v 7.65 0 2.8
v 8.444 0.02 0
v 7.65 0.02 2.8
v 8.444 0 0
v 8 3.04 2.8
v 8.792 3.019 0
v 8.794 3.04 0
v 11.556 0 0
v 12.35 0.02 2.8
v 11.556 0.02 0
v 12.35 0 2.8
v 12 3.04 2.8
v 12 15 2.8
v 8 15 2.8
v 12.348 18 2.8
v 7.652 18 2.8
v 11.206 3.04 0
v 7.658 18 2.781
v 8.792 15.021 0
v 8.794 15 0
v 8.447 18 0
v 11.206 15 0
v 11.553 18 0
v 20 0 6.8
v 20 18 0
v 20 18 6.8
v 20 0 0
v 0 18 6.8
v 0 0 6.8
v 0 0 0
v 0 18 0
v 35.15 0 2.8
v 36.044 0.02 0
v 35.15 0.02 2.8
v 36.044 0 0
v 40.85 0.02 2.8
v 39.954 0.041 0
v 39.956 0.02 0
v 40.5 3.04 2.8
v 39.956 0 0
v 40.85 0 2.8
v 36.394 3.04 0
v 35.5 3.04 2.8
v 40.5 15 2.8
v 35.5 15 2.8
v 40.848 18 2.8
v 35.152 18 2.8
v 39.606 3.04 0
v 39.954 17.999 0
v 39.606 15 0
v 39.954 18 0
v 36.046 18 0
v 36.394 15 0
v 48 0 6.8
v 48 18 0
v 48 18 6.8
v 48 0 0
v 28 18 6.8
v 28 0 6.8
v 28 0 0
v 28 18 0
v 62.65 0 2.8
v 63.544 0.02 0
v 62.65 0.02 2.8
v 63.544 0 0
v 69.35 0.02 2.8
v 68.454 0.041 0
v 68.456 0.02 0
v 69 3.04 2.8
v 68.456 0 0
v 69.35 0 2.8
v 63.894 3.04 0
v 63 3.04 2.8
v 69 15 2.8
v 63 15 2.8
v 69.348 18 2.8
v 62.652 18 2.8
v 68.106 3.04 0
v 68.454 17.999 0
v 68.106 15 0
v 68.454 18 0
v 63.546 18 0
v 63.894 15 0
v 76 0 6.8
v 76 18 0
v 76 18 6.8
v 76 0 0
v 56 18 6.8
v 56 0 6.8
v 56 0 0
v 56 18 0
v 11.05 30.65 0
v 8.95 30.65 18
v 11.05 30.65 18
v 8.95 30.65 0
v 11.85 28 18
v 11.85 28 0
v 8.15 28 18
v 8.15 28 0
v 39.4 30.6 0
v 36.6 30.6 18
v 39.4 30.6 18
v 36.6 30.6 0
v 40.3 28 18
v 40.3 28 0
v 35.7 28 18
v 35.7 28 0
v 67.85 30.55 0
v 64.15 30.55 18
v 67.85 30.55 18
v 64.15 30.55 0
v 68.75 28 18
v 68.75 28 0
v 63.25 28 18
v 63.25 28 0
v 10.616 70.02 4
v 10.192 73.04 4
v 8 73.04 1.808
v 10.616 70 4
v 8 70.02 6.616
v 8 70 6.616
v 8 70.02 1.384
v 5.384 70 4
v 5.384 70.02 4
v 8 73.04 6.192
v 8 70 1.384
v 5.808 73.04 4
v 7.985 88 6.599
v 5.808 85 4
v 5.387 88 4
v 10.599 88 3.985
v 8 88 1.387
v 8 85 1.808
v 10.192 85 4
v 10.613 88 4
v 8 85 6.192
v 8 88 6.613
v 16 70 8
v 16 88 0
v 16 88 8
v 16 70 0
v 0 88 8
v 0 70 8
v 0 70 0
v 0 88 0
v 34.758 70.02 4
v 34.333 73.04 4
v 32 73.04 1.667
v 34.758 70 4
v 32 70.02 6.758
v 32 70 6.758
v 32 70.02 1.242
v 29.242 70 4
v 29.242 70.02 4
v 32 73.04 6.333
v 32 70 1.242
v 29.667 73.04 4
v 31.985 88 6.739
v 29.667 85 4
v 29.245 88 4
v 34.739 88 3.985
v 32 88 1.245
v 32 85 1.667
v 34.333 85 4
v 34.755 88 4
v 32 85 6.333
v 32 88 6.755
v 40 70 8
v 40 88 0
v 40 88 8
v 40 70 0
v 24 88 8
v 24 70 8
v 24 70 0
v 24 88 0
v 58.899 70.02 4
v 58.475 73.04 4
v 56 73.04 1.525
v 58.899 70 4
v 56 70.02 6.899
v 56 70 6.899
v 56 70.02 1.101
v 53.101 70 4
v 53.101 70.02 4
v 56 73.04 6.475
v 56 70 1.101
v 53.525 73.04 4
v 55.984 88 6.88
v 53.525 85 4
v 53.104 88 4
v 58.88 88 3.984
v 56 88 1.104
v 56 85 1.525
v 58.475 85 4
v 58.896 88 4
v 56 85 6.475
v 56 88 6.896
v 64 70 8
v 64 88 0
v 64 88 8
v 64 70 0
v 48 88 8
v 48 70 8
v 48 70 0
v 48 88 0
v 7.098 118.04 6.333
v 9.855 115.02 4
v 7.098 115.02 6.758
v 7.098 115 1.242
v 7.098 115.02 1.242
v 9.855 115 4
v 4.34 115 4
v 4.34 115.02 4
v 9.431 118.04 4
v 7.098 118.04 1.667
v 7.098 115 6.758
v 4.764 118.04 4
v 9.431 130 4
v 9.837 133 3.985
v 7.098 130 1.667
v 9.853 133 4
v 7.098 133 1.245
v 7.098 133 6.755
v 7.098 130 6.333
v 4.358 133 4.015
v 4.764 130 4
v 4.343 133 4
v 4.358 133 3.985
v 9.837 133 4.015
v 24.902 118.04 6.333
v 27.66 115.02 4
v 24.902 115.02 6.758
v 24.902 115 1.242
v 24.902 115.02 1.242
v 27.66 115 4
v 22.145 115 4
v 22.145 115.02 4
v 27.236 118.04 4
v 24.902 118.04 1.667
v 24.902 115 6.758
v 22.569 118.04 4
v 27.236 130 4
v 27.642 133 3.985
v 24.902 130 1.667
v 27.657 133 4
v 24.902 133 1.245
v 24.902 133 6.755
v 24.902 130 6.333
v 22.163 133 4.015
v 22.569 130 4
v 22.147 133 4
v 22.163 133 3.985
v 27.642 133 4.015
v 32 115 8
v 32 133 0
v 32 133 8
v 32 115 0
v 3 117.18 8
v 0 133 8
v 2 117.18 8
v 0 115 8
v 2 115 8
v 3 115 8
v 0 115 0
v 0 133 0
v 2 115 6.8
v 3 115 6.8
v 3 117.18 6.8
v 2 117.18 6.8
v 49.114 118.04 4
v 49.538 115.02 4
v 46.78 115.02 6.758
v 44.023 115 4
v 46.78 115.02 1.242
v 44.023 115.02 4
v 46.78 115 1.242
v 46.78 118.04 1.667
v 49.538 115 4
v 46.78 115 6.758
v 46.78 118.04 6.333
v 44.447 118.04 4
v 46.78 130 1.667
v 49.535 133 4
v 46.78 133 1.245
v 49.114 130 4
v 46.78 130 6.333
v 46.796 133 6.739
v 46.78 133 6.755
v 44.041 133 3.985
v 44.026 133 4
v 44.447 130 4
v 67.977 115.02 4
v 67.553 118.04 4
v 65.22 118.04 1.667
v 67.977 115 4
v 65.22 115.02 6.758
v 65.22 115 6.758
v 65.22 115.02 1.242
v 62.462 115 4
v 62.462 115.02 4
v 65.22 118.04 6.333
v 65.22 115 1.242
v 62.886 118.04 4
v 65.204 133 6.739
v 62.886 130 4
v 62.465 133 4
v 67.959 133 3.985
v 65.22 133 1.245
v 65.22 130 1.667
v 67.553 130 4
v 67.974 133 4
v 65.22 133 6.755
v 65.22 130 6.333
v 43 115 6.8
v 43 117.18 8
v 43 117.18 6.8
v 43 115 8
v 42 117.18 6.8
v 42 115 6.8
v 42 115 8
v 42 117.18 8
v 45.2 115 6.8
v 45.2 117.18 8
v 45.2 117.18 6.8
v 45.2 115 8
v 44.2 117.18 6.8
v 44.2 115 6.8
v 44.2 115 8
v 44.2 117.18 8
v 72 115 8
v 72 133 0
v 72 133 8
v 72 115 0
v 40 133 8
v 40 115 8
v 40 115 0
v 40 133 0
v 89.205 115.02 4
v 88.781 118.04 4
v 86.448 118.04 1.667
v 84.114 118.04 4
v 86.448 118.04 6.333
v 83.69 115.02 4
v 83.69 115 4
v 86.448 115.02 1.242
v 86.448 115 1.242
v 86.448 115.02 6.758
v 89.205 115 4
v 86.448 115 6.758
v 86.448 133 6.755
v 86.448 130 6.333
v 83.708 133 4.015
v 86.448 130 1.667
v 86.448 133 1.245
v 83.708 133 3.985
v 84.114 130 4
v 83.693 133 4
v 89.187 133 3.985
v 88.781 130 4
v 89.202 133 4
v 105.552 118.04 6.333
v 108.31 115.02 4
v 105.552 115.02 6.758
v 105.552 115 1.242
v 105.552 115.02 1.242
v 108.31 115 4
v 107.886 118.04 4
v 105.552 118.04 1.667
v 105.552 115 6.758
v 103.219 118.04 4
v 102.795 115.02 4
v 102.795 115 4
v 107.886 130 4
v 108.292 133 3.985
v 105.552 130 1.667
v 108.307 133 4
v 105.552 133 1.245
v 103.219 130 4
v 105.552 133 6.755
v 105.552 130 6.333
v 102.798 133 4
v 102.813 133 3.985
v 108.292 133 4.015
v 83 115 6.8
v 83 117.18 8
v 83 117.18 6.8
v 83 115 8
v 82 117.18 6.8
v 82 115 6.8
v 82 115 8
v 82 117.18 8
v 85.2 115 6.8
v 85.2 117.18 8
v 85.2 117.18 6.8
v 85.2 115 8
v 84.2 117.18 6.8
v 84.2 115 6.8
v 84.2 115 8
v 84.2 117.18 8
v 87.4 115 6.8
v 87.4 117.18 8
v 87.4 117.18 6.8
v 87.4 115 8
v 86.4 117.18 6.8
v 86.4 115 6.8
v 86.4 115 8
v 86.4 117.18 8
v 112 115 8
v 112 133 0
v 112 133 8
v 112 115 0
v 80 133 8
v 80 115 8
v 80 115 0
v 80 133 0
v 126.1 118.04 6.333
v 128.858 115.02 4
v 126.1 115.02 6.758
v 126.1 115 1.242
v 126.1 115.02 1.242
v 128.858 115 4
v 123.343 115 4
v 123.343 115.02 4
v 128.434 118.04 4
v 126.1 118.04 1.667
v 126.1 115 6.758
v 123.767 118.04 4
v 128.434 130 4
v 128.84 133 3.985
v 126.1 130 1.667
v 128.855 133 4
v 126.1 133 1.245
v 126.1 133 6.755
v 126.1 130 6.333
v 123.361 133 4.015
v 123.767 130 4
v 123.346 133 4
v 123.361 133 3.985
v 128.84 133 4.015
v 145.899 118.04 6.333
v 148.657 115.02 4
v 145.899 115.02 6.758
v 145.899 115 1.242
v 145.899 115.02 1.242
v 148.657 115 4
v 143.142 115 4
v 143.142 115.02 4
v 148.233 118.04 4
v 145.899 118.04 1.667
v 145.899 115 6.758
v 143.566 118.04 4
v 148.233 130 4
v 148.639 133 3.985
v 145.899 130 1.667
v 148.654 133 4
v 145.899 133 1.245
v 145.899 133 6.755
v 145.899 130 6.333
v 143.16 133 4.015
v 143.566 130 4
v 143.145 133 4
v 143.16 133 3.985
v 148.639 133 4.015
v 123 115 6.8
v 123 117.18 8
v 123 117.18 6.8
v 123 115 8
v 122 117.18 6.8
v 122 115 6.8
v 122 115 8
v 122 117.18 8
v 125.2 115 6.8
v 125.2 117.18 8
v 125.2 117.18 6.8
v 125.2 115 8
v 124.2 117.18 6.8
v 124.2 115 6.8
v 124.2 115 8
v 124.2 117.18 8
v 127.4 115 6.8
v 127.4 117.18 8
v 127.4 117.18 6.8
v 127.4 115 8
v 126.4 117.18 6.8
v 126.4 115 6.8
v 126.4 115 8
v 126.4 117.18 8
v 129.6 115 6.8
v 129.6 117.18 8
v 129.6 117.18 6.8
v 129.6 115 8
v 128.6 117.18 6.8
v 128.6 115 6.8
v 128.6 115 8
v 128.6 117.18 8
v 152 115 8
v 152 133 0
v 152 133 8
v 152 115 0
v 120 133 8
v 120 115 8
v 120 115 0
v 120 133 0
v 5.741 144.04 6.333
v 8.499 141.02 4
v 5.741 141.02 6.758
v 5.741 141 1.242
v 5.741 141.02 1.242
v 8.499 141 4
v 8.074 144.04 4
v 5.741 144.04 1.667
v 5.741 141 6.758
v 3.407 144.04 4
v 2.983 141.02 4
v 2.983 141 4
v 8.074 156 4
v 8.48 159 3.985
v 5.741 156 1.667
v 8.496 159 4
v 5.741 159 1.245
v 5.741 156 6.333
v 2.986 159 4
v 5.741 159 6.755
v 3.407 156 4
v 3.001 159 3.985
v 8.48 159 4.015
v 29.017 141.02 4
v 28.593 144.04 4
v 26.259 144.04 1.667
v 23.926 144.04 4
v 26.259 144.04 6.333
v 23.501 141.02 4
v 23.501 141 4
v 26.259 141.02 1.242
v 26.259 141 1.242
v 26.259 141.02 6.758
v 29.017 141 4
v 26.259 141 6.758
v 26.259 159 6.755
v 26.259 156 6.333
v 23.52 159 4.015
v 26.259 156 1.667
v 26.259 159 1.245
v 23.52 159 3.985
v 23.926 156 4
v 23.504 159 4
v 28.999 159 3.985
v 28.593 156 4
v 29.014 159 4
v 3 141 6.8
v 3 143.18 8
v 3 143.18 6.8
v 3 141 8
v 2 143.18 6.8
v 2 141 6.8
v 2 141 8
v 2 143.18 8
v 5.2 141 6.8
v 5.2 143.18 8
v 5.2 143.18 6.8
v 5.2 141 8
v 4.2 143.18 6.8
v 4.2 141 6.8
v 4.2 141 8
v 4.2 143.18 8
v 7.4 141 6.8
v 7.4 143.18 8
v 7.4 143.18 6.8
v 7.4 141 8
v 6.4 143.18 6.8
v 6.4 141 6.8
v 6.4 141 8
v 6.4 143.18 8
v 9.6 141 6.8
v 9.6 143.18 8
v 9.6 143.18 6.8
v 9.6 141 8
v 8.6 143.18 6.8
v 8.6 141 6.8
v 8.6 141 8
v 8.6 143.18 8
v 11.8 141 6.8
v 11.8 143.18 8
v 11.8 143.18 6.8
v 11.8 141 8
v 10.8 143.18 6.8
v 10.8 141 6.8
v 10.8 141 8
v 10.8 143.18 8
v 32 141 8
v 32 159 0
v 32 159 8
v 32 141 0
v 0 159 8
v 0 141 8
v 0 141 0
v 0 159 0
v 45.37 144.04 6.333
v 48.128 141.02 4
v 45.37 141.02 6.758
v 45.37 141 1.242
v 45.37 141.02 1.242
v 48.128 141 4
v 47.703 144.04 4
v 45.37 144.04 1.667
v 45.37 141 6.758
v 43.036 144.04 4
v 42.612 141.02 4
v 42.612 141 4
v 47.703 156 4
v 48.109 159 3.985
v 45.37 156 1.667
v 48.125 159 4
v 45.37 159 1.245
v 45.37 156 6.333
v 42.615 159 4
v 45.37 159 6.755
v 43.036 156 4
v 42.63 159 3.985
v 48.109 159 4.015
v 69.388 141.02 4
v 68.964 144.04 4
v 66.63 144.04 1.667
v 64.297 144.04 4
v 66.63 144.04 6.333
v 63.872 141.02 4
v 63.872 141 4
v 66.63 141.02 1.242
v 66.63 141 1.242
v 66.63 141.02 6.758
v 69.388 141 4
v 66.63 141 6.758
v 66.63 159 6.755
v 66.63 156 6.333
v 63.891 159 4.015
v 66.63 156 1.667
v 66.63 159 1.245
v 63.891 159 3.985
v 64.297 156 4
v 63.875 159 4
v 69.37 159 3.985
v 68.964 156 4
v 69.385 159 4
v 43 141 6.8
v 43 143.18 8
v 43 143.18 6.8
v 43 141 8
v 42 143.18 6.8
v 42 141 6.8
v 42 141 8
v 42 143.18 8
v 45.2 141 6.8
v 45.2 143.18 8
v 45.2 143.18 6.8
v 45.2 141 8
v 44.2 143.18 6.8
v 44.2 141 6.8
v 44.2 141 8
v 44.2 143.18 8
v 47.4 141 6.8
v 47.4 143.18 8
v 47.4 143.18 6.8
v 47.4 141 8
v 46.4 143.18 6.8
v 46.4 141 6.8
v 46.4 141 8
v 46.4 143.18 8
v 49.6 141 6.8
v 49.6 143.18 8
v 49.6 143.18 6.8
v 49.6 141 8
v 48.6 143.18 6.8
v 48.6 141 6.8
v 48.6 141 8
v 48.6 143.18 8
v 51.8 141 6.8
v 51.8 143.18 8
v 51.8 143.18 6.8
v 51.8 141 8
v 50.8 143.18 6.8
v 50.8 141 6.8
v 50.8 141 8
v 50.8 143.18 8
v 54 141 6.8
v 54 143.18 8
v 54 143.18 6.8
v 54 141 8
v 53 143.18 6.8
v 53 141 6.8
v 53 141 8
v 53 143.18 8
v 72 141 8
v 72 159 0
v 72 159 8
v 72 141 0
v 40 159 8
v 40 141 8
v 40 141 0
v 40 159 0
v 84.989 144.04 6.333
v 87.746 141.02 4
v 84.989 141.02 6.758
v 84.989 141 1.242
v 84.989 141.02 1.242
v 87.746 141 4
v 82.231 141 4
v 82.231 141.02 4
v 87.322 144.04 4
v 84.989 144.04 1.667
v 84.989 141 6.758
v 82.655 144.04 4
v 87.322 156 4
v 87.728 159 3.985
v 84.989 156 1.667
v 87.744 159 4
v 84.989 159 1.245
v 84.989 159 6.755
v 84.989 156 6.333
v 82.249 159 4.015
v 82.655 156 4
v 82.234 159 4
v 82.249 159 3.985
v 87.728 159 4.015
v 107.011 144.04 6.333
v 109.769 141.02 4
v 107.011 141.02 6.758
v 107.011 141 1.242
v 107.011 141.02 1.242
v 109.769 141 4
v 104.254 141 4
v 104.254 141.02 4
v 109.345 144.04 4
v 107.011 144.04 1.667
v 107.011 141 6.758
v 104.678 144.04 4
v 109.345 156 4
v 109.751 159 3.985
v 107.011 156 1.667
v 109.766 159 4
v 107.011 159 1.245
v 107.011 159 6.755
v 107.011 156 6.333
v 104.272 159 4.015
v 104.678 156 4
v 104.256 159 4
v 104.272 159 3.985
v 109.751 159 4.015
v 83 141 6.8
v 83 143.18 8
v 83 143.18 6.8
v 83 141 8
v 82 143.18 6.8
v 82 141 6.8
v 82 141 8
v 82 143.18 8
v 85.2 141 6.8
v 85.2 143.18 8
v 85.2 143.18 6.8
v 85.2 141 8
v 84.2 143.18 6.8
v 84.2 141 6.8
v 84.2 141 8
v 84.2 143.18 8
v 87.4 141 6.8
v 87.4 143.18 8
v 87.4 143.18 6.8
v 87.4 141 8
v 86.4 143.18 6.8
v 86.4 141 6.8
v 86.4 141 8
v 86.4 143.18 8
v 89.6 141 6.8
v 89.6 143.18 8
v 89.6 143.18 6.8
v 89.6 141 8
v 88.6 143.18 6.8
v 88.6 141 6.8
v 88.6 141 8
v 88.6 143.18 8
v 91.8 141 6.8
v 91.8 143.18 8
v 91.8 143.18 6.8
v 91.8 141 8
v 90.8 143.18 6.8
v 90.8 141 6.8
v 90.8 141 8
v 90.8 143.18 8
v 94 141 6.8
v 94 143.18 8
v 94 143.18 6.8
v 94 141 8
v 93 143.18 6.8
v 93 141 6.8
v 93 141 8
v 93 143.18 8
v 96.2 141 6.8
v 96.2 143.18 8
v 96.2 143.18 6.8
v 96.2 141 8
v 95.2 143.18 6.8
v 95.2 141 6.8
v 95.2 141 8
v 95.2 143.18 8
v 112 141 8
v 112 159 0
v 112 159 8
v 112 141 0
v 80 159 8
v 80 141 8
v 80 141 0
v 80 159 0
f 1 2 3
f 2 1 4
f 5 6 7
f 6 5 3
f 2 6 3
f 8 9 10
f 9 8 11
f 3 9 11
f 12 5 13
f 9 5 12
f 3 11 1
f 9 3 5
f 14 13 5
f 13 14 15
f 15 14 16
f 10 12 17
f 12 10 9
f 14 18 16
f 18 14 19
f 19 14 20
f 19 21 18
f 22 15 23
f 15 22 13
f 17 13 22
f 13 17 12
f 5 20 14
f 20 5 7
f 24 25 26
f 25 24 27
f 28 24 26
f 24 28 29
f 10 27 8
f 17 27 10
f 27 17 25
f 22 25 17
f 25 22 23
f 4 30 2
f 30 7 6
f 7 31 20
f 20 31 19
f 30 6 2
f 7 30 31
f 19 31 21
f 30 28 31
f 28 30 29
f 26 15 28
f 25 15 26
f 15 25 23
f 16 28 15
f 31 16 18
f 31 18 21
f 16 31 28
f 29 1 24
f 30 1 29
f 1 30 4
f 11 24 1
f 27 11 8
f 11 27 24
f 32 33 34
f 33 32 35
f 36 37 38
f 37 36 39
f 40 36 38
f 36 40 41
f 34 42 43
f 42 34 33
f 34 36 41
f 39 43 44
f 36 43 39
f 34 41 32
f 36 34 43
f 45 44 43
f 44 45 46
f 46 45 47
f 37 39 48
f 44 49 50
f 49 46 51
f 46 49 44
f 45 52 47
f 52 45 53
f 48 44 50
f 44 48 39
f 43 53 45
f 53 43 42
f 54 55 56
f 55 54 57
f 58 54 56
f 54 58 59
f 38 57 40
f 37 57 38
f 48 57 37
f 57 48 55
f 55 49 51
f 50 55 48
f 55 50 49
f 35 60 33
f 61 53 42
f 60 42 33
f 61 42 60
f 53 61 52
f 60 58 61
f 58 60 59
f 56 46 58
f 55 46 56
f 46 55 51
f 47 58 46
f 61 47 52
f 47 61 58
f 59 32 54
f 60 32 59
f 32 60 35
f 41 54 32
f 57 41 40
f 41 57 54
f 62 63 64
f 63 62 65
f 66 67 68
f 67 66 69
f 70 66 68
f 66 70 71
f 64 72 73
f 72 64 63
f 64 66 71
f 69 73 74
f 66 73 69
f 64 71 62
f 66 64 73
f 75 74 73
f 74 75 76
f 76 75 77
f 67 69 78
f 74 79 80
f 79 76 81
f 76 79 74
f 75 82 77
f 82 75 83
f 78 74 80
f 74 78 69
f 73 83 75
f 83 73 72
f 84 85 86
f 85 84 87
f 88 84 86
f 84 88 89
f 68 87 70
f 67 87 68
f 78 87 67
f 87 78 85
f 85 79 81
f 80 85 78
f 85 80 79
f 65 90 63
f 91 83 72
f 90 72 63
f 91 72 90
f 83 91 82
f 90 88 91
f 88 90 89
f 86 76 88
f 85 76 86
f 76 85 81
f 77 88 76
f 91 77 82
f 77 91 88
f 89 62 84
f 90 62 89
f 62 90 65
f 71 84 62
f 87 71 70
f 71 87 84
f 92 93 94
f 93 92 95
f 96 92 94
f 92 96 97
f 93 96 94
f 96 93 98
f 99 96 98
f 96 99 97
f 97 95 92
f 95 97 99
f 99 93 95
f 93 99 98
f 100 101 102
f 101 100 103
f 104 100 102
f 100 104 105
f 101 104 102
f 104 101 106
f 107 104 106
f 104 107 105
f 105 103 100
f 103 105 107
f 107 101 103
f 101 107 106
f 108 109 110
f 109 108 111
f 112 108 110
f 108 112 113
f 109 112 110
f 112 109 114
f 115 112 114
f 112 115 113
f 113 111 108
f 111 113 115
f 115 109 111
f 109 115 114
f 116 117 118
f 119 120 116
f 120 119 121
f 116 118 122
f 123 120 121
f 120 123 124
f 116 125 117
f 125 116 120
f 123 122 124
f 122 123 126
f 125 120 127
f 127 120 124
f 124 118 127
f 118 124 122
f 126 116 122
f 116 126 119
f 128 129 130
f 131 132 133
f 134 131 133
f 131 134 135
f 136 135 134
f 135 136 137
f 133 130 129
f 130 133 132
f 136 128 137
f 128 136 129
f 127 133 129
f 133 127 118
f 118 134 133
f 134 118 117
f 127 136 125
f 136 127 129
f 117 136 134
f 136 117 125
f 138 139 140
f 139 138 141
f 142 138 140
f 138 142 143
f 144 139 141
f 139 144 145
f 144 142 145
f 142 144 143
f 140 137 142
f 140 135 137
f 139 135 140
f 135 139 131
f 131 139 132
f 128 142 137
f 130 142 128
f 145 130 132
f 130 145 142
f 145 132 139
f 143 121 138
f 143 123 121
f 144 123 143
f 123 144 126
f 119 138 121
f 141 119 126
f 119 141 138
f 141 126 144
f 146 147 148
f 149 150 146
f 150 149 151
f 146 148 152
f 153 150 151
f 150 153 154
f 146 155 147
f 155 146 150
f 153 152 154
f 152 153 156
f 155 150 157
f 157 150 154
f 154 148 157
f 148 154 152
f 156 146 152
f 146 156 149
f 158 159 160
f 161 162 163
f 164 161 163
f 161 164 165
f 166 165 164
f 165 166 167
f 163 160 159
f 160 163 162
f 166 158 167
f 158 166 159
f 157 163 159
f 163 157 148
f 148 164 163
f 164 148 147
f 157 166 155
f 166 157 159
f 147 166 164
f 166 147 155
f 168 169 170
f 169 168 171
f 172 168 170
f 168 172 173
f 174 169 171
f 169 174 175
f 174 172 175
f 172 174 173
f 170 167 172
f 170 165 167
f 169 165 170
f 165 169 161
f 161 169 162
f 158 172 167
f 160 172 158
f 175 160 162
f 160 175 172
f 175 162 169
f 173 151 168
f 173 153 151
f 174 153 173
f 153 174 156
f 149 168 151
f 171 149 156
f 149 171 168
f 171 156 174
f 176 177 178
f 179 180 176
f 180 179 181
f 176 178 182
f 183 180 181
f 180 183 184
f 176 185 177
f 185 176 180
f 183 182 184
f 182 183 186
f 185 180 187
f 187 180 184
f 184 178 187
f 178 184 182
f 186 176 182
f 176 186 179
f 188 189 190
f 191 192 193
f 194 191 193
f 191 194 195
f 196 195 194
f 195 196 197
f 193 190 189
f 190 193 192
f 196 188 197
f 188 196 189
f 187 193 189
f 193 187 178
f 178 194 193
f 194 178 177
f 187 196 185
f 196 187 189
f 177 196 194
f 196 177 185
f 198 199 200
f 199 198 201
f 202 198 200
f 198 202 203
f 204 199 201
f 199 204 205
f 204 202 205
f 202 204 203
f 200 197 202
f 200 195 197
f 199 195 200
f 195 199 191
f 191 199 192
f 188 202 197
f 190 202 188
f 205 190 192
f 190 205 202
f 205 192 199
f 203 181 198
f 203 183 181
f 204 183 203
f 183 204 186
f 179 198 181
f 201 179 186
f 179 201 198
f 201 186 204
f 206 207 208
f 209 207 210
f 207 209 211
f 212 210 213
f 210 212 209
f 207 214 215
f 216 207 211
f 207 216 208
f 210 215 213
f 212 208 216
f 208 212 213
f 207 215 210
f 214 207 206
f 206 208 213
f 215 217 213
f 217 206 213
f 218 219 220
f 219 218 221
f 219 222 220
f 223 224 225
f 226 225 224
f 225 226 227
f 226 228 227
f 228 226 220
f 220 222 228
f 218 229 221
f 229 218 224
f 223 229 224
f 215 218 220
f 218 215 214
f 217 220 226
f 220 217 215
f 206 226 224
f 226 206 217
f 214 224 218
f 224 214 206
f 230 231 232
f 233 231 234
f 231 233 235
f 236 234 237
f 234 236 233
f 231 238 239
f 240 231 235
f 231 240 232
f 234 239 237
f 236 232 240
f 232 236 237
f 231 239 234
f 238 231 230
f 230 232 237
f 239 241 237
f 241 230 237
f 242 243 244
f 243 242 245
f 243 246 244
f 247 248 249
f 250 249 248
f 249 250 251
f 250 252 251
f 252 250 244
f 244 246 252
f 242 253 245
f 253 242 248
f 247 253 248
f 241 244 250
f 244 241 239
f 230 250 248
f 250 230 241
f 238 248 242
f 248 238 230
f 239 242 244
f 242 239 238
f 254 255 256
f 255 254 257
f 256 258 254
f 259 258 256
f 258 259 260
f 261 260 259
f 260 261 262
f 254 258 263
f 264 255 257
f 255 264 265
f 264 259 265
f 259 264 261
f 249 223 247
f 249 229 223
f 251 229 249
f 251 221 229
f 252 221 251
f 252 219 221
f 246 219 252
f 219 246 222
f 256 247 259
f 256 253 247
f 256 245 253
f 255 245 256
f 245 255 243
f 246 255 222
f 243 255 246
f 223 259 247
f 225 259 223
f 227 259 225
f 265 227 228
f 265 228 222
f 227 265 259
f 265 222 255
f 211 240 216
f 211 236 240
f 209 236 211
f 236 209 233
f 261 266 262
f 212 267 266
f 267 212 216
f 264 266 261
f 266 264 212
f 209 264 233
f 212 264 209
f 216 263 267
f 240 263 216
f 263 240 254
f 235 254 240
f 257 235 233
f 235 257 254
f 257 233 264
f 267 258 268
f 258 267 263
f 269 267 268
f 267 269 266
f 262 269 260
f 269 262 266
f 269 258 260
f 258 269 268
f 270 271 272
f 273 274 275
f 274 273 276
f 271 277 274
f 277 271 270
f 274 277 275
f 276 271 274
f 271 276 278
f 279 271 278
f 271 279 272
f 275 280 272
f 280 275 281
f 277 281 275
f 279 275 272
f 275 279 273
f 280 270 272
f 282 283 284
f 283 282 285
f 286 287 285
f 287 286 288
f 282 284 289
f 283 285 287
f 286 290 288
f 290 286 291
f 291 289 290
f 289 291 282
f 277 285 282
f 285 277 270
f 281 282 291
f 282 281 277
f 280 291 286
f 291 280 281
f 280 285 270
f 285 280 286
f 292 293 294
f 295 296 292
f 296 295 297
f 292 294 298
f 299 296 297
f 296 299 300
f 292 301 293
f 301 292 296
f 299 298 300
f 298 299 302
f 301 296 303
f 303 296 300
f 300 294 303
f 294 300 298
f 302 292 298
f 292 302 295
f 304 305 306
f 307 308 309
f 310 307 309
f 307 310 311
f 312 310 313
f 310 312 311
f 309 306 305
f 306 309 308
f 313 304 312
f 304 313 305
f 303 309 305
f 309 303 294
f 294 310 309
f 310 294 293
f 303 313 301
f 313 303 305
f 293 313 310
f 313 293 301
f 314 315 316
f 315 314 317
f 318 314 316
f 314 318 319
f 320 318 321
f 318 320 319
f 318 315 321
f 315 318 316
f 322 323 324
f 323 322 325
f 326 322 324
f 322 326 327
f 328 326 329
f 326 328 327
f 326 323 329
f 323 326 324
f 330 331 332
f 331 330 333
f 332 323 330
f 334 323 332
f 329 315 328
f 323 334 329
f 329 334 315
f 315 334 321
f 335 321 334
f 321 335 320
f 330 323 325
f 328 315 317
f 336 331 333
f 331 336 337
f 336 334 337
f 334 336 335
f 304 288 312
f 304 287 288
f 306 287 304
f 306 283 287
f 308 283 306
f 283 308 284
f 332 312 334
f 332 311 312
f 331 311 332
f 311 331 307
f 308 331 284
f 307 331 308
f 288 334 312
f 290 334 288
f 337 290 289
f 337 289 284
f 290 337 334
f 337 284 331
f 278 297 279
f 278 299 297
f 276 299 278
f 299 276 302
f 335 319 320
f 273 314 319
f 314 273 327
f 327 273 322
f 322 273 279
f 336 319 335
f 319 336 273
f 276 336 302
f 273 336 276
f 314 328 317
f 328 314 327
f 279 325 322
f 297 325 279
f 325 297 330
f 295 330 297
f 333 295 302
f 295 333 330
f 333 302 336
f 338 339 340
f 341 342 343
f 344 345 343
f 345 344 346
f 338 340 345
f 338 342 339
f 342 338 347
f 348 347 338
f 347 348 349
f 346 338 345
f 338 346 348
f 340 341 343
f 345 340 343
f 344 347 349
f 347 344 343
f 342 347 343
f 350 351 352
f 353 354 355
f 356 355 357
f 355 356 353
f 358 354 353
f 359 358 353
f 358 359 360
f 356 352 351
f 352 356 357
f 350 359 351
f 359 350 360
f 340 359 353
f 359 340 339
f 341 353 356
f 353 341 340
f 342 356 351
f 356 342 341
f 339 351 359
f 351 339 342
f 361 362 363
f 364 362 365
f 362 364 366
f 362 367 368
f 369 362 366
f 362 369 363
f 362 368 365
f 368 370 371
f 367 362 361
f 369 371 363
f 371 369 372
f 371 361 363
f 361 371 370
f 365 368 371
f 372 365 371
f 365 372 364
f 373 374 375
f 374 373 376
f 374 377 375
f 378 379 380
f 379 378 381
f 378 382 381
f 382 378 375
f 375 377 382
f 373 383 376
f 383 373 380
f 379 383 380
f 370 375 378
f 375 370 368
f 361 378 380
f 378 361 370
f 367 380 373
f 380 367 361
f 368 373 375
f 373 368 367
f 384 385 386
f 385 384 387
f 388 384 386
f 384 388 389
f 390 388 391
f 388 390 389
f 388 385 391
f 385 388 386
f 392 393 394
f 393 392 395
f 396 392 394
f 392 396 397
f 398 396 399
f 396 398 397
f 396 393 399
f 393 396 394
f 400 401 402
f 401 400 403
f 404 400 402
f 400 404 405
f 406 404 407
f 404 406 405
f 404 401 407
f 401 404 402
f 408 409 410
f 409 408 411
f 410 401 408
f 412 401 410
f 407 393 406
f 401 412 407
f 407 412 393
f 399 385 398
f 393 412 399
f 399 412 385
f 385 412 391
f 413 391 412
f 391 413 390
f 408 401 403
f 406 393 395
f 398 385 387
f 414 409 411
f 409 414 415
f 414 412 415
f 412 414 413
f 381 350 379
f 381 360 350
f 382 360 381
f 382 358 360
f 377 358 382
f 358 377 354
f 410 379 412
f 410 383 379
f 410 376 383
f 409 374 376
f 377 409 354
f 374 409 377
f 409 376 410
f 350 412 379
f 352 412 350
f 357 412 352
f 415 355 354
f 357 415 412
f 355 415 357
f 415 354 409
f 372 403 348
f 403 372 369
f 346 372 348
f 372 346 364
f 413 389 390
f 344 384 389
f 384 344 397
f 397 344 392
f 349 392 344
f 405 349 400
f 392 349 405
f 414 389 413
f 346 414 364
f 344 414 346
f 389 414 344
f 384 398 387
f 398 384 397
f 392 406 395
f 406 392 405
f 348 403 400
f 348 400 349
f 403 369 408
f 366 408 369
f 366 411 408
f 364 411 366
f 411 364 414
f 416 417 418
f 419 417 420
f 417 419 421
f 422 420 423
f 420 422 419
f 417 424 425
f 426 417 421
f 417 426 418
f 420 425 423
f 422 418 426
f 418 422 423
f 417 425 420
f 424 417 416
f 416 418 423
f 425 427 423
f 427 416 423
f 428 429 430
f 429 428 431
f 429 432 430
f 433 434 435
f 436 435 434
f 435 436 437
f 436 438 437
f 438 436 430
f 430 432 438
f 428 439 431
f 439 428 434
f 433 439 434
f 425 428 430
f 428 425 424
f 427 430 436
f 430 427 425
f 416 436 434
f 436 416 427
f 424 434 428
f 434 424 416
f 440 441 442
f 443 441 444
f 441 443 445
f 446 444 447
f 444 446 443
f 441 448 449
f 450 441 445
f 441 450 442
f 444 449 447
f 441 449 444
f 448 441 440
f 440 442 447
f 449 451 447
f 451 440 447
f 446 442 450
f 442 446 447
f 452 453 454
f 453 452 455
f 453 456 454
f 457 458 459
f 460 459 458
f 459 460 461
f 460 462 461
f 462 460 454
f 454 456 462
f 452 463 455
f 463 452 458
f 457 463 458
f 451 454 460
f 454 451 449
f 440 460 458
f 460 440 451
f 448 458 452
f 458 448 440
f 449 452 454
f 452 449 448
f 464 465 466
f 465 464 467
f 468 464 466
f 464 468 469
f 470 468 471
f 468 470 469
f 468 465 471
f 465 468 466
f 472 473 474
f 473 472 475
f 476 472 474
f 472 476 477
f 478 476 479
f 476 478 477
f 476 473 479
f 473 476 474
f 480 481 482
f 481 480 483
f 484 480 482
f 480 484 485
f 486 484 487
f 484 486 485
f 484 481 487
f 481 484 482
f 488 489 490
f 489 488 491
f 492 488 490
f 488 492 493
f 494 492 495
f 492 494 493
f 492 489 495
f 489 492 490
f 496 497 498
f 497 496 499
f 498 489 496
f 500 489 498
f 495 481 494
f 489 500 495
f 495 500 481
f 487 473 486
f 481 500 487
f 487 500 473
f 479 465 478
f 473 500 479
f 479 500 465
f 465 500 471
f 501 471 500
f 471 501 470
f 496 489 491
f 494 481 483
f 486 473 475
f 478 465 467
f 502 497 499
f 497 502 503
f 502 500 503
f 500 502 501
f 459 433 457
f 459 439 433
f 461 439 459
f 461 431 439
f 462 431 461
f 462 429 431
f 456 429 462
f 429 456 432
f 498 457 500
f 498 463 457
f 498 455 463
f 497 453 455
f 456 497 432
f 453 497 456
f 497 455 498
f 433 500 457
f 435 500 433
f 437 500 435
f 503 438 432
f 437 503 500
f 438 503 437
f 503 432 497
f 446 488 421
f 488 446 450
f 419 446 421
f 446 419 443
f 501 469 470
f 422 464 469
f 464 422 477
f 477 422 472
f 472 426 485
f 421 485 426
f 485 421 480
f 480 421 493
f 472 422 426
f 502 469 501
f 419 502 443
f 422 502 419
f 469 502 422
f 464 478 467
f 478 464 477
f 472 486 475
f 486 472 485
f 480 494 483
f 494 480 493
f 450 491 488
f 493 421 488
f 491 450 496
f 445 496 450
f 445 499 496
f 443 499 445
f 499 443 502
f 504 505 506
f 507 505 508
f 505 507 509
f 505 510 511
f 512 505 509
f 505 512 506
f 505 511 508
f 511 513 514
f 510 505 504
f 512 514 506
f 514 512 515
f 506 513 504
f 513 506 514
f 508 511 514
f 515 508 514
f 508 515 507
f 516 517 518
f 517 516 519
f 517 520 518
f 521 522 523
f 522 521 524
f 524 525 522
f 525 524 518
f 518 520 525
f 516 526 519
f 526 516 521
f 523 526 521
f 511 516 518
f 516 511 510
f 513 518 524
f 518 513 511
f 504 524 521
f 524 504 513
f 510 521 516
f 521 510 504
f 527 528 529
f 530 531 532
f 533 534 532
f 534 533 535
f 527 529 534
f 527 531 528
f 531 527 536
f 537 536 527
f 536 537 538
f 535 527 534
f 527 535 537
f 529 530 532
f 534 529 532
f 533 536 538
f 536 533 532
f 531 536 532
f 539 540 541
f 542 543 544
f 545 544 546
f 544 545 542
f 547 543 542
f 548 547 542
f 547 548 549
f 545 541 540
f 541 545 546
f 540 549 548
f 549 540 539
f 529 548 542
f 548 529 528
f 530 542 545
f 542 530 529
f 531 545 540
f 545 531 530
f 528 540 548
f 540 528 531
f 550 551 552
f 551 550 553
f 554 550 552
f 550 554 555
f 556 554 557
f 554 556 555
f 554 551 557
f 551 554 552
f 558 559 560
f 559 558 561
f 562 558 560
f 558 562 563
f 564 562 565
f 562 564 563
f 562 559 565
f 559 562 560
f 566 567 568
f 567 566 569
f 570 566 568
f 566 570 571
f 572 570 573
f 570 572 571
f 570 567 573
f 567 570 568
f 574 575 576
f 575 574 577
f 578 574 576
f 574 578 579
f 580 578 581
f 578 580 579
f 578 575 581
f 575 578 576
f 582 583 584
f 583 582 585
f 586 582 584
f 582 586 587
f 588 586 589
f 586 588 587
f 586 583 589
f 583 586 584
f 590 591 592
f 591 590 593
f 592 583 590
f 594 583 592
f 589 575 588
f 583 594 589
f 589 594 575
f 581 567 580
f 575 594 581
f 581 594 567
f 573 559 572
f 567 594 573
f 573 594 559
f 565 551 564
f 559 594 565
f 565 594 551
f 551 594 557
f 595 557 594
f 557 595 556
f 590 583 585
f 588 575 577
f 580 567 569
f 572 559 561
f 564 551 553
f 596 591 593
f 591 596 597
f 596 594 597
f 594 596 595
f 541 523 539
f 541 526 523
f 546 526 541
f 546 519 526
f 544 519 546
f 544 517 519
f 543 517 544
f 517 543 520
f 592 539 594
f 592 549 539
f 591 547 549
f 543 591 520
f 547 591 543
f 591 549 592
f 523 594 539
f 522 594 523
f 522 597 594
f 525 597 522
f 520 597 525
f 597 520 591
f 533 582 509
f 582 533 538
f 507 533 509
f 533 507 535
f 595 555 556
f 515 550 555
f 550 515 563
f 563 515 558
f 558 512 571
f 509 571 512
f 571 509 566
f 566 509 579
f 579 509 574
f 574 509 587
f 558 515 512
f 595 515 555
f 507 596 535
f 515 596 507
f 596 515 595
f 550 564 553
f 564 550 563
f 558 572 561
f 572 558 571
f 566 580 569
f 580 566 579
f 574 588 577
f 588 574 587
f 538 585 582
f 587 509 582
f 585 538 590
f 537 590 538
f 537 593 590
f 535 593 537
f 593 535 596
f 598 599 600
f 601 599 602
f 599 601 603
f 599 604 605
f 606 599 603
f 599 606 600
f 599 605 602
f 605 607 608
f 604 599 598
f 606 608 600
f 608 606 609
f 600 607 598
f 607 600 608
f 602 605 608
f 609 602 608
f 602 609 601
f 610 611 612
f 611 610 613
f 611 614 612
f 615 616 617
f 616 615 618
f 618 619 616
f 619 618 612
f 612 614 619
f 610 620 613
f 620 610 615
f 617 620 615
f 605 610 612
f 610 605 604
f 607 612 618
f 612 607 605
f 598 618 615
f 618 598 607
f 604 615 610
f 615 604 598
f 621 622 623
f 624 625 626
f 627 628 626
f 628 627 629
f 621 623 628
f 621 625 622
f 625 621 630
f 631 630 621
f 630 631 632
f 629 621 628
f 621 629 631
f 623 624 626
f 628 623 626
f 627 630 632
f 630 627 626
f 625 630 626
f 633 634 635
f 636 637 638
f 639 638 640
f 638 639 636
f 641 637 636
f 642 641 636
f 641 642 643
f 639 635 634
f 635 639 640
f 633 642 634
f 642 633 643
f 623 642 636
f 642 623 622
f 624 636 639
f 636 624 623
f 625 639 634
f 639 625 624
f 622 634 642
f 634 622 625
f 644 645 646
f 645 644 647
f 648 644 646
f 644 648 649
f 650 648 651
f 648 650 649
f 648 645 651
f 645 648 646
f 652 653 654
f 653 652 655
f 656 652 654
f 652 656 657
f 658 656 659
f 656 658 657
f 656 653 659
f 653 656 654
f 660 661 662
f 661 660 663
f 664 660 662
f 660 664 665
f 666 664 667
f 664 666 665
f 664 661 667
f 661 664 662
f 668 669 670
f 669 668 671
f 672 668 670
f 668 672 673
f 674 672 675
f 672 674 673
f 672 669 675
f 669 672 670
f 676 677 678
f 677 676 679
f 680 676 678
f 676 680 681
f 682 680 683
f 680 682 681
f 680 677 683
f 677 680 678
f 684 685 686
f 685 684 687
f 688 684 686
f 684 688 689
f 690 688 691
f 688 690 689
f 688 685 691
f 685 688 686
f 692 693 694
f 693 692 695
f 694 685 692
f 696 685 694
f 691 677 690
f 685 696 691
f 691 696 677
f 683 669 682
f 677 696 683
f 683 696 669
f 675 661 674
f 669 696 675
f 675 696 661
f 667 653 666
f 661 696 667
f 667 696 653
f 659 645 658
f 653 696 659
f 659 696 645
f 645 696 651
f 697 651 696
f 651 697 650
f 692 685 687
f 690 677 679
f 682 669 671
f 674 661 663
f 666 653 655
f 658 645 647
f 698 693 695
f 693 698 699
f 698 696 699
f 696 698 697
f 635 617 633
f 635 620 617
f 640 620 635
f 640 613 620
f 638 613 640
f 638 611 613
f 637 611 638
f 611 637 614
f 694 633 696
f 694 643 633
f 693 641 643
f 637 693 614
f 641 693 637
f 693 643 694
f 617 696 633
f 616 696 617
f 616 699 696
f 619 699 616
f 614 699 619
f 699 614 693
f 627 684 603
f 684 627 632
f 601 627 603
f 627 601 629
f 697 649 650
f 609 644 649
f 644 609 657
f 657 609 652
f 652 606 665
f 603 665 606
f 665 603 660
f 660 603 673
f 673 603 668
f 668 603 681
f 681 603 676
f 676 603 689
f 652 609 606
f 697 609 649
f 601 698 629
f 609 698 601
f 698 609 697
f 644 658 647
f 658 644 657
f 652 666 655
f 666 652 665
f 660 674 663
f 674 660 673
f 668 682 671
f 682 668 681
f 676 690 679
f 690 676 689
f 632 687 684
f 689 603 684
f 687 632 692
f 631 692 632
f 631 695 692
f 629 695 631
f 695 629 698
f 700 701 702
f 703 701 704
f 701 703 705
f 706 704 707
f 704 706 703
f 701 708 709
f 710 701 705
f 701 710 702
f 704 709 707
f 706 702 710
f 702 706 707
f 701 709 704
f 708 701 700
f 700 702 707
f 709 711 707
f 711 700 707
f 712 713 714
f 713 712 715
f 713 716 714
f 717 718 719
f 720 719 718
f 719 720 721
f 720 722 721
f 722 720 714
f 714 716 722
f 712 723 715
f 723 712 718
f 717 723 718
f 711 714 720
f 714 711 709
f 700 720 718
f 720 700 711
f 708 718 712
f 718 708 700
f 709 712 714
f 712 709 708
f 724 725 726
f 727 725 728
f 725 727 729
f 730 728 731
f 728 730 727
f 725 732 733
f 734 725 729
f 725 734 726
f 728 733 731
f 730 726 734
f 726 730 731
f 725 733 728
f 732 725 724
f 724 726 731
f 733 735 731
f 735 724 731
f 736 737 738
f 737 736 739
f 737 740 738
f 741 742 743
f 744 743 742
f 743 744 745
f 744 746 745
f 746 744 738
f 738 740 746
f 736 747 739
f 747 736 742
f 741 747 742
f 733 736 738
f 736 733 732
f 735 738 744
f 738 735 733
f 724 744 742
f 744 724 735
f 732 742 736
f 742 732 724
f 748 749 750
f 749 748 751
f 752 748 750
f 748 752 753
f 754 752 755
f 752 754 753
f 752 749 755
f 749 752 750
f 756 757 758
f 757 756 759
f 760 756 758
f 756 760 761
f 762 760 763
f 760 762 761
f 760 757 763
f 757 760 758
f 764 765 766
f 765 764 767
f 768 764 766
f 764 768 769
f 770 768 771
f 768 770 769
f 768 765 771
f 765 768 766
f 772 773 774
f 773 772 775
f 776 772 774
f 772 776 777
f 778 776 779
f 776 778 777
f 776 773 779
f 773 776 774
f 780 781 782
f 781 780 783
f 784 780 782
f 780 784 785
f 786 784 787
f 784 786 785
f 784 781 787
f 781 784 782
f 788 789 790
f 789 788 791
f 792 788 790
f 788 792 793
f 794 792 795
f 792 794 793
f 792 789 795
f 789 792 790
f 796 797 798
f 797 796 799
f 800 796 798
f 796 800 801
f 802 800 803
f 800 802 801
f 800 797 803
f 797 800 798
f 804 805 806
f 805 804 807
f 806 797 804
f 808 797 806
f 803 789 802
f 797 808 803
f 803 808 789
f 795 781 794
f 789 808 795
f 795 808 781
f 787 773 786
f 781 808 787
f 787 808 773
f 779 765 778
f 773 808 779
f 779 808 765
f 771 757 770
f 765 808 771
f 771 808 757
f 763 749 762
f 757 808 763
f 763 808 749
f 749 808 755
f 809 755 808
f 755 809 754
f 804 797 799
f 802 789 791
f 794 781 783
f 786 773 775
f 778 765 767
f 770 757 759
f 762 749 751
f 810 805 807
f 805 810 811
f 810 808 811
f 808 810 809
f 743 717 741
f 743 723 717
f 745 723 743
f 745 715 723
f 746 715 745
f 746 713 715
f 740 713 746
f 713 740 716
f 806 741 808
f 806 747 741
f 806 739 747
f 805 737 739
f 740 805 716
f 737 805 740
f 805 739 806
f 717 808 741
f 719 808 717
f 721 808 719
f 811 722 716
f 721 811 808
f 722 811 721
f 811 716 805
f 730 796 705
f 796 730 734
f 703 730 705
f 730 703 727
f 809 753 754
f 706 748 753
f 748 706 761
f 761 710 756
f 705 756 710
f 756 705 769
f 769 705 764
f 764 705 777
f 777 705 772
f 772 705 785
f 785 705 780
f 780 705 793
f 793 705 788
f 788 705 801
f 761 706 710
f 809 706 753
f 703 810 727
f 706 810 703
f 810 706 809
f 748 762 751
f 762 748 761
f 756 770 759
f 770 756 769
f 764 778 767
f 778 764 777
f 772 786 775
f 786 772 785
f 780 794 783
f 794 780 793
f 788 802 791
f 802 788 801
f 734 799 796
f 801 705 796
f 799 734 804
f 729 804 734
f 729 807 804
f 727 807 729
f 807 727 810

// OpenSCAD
// file: lib/registers.scad
/* Diamond garden-stake registers and seven-position kinematics. */

function lock_positions() = [-3, -2, -1, 0, 1, 2, 3];

function travel_per_height_step(
    wedge_length,
    total_height_range,
    height_step
) = height_step / (total_height_range / wedge_length);

function lock_shift(
    position,
    wedge_length,
    total_height_range,
    height_step
) = position * travel_per_height_step(
    wedge_length,
    total_height_range,
    height_step
);

function lock_height(position, nominal_height, height_step) =
    nominal_height + position * height_step;

function lower_register_x(position, center_x, pitch) =
    center_x + position * pitch;

function nominal_lock_dx(nominal_height, register_center_depth) =
    nominal_height - 2 * register_center_depth;

function upper_register_local_x(
    position,
    wedge_length,
    total_height_range,
    height_step,
    lower_center_x,
    lower_pitch,
    register_center_depth,
    nominal_height
) =
    wedge_length
    + lock_shift(position, wedge_length, total_height_range, height_step)
    - lower_register_x(position, lower_center_x, lower_pitch)
    - nominal_lock_dx(nominal_height, register_center_depth);

function upper_register_global_x(
    position,
    wedge_length,
    total_height_range,
    height_step,
    upper_local_x
) =
    wedge_length
    + lock_shift(position, wedge_length, total_height_range, height_step)
    - upper_local_x;

function diamond_half_diagonal(square_side) = square_side / sqrt(2);

function diamond_points(center_x, center_z, square_side) = [
    [center_x, center_z - diamond_half_diagonal(square_side)],
    [center_x + diamond_half_diagonal(square_side), center_z],
    [center_x, center_z + diamond_half_diagonal(square_side)],
    [center_x - diamond_half_diagonal(square_side), center_z]
];

module register_prism_along_y(points, y_start, length) {
    translate([0, y_start + length, 0])
        rotate([90, 0, 0])
            linear_extrude(height = length, convexity = 10)
                polygon(points = points);
}

module register_section_at_y(points, y_position, thickness = 0.04) {
    register_prism_along_y(points, y_position, thickness);
}

module diamond_tunnel_cut(
    center_x,
    center_z,
    span_y,
    square_side,
    entry_length,
    entry_relief,
    epsilon = 0.02
) {
    nominal = diamond_points(center_x, center_z, square_side);
    relieved = diamond_points(
        center_x,
        center_z,
        square_side + 2 * entry_relief
    );

    register_prism_along_y(
        nominal,
        -epsilon,
        span_y + 2 * epsilon
    );

    if (entry_length > 0 && entry_relief > 0) {
        hull() {
            register_section_at_y(relieved, -epsilon);
            register_section_at_y(nominal, entry_length);
        }
        hull() {
            register_section_at_y(nominal, span_y - entry_length);
            register_section_at_y(relieved, span_y + epsilon);
        }
    }
}

module lower_register_row(
    wedge_width,
    center_x,
    pitch,
    center_z,
    square_side,
    entry_length,
    entry_relief,
    epsilon = 0.02
) {
    for (position = lock_positions())
        diamond_tunnel_cut(
            lower_register_x(position, center_x, pitch),
            center_z,
            wedge_width,
            square_side,
            entry_length,
            entry_relief,
            epsilon
        );
}

module upper_register_row(
    wedge_length,
    wedge_width,
    nominal_height,
    total_height_range,
    height_step,
    lower_center_x,
    lower_pitch,
    center_z,
    square_side,
    entry_length,
    entry_relief,
    epsilon = 0.02
) {
    for (position = lock_positions())
        diamond_tunnel_cut(
            upper_register_local_x(
                position,
                wedge_length,
                total_height_range,
                height_step,
                lower_center_x,
                lower_pitch,
                center_z,
                nominal_height
            ),
            center_z,
            wedge_width,
            square_side,
            entry_length,
            entry_relief,
            epsilon
        );
}

module rod_along_y(x, y_start, z, length, radius, facets = 32) {
    translate([x, y_start, z])
        rotate([-90, 0, 0])
            cylinder(h = length, r = radius, $fn = facets);
}

module garden_stake_preview(
    lower_x,
    lower_z,
    upper_x,
    upper_z,
    wedge_width,
    wire_diameter,
    handle_offset = 10,
    tip_overhang = 8
) {
    radius = wire_diameter / 2;
    y_start = -handle_offset;
    leg_length = wedge_width + handle_offset + tip_overhang;

    rod_along_y(lower_x, y_start, lower_z, leg_length, radius);
    rod_along_y(upper_x, y_start, upper_z, leg_length, radius);

    hull() {
        translate([lower_x, y_start, lower_z]) sphere(r = radius, $fn = 24);
        translate([upper_x, y_start, upper_z]) sphere(r = radius, $fn = 24);
    }
}
// file: lib/dovetail.scad
/* Transverse dovetail geometry with canonical two-ended entry relief. */

function female_dovetail_points(
    center_x,
    head_width,
    neck_width,
    depth,
    epsilon = 0.02
) = [
    [center_x - neck_width / 2, -epsilon],
    [center_x + neck_width / 2, -epsilon],
    [center_x + head_width / 2, depth],
    [center_x - head_width / 2, depth]
];

function male_dovetail_points(center_x, head_width, neck_width, depth) = [
    [center_x - neck_width / 2, 0],
    [center_x + neck_width / 2, 0],
    [center_x + head_width / 2, depth],
    [center_x - head_width / 2, depth]
];

module prism_along_y(points, y_start, length) {
    translate([0, y_start + length, 0])
        rotate([90, 0, 0])
            linear_extrude(height = length, convexity = 10)
                polygon(points = points);
}

module section_at_y(points, y_position, thickness = 0.04) {
    prism_along_y(points, y_position, thickness);
}

module dovetail_socket_cut(
    center_x,
    span_y,
    head_width,
    neck_width,
    depth,
    entry_length,
    entry_relief,
    epsilon = 0.02
) {
    nominal = female_dovetail_points(
        center_x,
        head_width,
        neck_width,
        depth,
        epsilon
    );
    relieved = female_dovetail_points(
        center_x,
        head_width + 2 * entry_relief,
        neck_width + 2 * entry_relief,
        depth,
        epsilon
    );

    prism_along_y(nominal, -epsilon, span_y + 2 * epsilon);

    if (entry_length > 0 && entry_relief > 0) {
        hull() {
            section_at_y(relieved, -epsilon);
            section_at_y(nominal, entry_length);
        }
        hull() {
            section_at_y(nominal, span_y - entry_length);
            section_at_y(relieved, span_y + epsilon);
        }
    }
}

module male_dovetail_rail(
    span_y,
    head_width,
    neck_width,
    depth
) {
    prism_along_y(
        male_dovetail_points(0, head_width, neck_width, depth),
        0,
        span_y
    );
}
// main file
/*
  Locking Wedge — dovetail and garden-stake fit coupons
  Batch 003

  Every female dovetail coupon uses the same entry relief as the wedges.
*/

use <lib/dovetail.scad>
use <lib/registers.scad>

coupon_family = "all"; // [all:All coupons,dovetail:Dovetail coupons,diamond:Diamond wire coupons,stake_spacing:Garden-stake spacing coupons]

// ---------- Dovetail coupons ----------

dovetail_depth = 2.8;        // [1.5:0.1:4]
dovetail_entry_length = 3.0; // [1:0.5:8]
dovetail_entry_relief = 0.35;// [0.1:0.05:1]

// ---------- Diamond wire and stake-spacing coupons ----------

nominal_height = 20;
height_step = 1.0;
register_center_depth = 3.0;
wire_diameter = 3.0;          // [2:0.1:5]
diamond_entry_length = 3.0;   // [1:0.5:8]
diamond_entry_relief = 0.30;  // [0.1:0.05:0.8]

female_coupon_x = 20;
female_coupon_y = 18;
female_coupon_z = dovetail_depth + 4;
diamond_coupon_x = 16;
diamond_coupon_y = 18;
diamond_coupon_z = 8;
coupon_gap = 8;
row_gap = 28;
stake_coupon_x = 32;
stake_coupon_y = 18;
stake_coupon_z = 8;
epsilon = 0.02;

module female_dovetail_coupon(head_width) {
    neck_width = max(2.4, head_width - 1.8);

    difference() {
        cube([female_coupon_x, female_coupon_y, female_coupon_z]);
        dovetail_socket_cut(
            female_coupon_x / 2,
            female_coupon_y,
            head_width,
            neck_width,
            dovetail_depth,
            dovetail_entry_length,
            dovetail_entry_relief,
            epsilon
        );
    }
}

module male_dovetail_coupon(head_width, clearance) {
    neck_width = max(2.4, head_width - 1.8);
    male_head = head_width - 2 * clearance;
    male_neck = neck_width - 2 * clearance;
    male_depth = dovetail_depth - clearance;

    translate([0, male_depth, 0])
        rotate([90, 0, 0])
            male_dovetail_rail(
                female_coupon_y,
                male_head,
                male_neck,
                male_depth
            );
}

module dovetail_coupon_set() {
    widths = [4, 5, 6];
    clearances = [0.15, 0.20, 0.25];

    for (i = [0 : 2]) {
        translate([i * (female_coupon_x + coupon_gap), 0, 0])
            female_dovetail_coupon(widths[i]);

        translate([
            i * (female_coupon_x + coupon_gap) + female_coupon_x / 2,
            row_gap,
            0
        ])
            male_dovetail_coupon(widths[i], clearances[i]);
    }
}

module diamond_wire_coupon(square_side) {
    difference() {
        cube([diamond_coupon_x, diamond_coupon_y, diamond_coupon_z]);
        diamond_tunnel_cut(
            diamond_coupon_x / 2,
            diamond_coupon_z / 2,
            diamond_coupon_y,
            square_side,
            diamond_entry_length,
            diamond_entry_relief,
            epsilon
        );
    }
}

module diamond_coupon_set() {
    clearances = [0.10, 0.30, 0.50];

    for (i = [0 : 2])
        translate([i * (diamond_coupon_x + coupon_gap), 0, 0])
            diamond_wire_coupon(wire_diameter + clearances[i]);
}


module stake_spacing_coupon(position) {
    lock_dx = nominal_height - 2 * register_center_depth;
    lock_dz = nominal_height + position * height_step
        - 2 * register_center_depth;
    spacing = sqrt(lock_dx * lock_dx + lock_dz * lock_dz);
    left_x = (stake_coupon_x - spacing) / 2;
    right_x = left_x + spacing;
    square_side = wire_diameter + 0.30;

    difference() {
        cube([stake_coupon_x, stake_coupon_y, stake_coupon_z]);
        diamond_tunnel_cut(
            left_x,
            stake_coupon_z / 2,
            stake_coupon_y,
            square_side,
            diamond_entry_length,
            diamond_entry_relief,
            epsilon
        );
        diamond_tunnel_cut(
            right_x,
            stake_coupon_z / 2,
            stake_coupon_y,
            square_side,
            diamond_entry_length,
            diamond_entry_relief,
            epsilon
        );

        // One through seven edge notches identify positions -3 through +3.
        for (marker = [0 : position + 3])
            translate([2 + marker * 2.2, -epsilon, stake_coupon_z - 1.2])
                cube([1.0, 2.2, 1.4]);
    }
}

module stake_spacing_coupon_set() {
    positions = [-3, -2, -1, 0, 1, 2, 3];

    for (i = [0 : 6]) {
        column = i % 4;
        row = floor(i / 4);
        translate([
            column * (stake_coupon_x + coupon_gap),
            row * (stake_coupon_y + coupon_gap),
            0
        ])
            stake_spacing_coupon(positions[i]);
    }
}

if (coupon_family == "all") {
    dovetail_coupon_set();
    translate([0, 70, 0]) diamond_coupon_set();
    translate([0, 115, 0]) stake_spacing_coupon_set();
} else if (coupon_family == "dovetail") {
    dovetail_coupon_set();
} else if (coupon_family == "diamond") {
    diamond_coupon_set();
} else if (coupon_family == "stake_spacing") {
    stake_spacing_coupon_set();
} else {
    assert(false, str("Unknown coupon_family: ", coupon_family));
}

echo(str("Dovetail female entry length: ",
    dovetail_entry_length, " mm"));
echo(str("Dovetail female entry relief: ",
    dovetail_entry_relief, " mm per side"));
echo(str("Diamond wire test sides: ",
    wire_diameter + 0.10, ", ",
    wire_diameter + 0.30, ", ",
    wire_diameter + 0.50, " mm"));
for (position = [-3, -2, -1, 0, 1, 2, 3]) {
    dx = nominal_height - 2 * register_center_depth;
    dz = nominal_height + position * height_step
        - 2 * register_center_depth;
    echo(str("Stake spacing coupon position ", position,
        ": ", sqrt(dx * dx + dz * dz), " mm"));
}
